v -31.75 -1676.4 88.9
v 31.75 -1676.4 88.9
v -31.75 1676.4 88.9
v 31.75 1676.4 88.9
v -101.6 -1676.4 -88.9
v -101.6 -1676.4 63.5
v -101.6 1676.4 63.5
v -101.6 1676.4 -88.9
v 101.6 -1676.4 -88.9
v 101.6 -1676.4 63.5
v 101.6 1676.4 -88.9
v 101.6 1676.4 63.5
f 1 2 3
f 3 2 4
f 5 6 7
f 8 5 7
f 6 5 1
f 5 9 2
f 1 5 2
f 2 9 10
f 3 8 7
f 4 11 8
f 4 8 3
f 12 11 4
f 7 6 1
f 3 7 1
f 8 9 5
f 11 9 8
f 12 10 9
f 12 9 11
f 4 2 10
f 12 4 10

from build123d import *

# Parameters (mm, degrees)
F0_W     = 3352.8
F0_H     = 177.8
F1_DEPTH = 101.6
F3_DEPTH = 3352.8


with BuildPart() as f1:
    # F0 (on Right) → F1 (new body, symmetric)
    with BuildSketch(Plane.YZ):
        Rectangle(F0_W, F0_H)
    extrude(amount=F1_DEPTH, both=True)

    # F2 (on face) → F3 (cut)
    with BuildSketch(Plane.XZ.offset(1676.4)):
        Polygon((-101.6, 88.9), (-101.6, 63.5), (-31.75, 88.9), align=None)
        Polygon((101.6, 88.9), (31.75, 88.9), (101.6, 63.5), align=None)
    extrude(amount=-F3_DEPTH, mode=Mode.SUBTRACT)


solid = f1.part
